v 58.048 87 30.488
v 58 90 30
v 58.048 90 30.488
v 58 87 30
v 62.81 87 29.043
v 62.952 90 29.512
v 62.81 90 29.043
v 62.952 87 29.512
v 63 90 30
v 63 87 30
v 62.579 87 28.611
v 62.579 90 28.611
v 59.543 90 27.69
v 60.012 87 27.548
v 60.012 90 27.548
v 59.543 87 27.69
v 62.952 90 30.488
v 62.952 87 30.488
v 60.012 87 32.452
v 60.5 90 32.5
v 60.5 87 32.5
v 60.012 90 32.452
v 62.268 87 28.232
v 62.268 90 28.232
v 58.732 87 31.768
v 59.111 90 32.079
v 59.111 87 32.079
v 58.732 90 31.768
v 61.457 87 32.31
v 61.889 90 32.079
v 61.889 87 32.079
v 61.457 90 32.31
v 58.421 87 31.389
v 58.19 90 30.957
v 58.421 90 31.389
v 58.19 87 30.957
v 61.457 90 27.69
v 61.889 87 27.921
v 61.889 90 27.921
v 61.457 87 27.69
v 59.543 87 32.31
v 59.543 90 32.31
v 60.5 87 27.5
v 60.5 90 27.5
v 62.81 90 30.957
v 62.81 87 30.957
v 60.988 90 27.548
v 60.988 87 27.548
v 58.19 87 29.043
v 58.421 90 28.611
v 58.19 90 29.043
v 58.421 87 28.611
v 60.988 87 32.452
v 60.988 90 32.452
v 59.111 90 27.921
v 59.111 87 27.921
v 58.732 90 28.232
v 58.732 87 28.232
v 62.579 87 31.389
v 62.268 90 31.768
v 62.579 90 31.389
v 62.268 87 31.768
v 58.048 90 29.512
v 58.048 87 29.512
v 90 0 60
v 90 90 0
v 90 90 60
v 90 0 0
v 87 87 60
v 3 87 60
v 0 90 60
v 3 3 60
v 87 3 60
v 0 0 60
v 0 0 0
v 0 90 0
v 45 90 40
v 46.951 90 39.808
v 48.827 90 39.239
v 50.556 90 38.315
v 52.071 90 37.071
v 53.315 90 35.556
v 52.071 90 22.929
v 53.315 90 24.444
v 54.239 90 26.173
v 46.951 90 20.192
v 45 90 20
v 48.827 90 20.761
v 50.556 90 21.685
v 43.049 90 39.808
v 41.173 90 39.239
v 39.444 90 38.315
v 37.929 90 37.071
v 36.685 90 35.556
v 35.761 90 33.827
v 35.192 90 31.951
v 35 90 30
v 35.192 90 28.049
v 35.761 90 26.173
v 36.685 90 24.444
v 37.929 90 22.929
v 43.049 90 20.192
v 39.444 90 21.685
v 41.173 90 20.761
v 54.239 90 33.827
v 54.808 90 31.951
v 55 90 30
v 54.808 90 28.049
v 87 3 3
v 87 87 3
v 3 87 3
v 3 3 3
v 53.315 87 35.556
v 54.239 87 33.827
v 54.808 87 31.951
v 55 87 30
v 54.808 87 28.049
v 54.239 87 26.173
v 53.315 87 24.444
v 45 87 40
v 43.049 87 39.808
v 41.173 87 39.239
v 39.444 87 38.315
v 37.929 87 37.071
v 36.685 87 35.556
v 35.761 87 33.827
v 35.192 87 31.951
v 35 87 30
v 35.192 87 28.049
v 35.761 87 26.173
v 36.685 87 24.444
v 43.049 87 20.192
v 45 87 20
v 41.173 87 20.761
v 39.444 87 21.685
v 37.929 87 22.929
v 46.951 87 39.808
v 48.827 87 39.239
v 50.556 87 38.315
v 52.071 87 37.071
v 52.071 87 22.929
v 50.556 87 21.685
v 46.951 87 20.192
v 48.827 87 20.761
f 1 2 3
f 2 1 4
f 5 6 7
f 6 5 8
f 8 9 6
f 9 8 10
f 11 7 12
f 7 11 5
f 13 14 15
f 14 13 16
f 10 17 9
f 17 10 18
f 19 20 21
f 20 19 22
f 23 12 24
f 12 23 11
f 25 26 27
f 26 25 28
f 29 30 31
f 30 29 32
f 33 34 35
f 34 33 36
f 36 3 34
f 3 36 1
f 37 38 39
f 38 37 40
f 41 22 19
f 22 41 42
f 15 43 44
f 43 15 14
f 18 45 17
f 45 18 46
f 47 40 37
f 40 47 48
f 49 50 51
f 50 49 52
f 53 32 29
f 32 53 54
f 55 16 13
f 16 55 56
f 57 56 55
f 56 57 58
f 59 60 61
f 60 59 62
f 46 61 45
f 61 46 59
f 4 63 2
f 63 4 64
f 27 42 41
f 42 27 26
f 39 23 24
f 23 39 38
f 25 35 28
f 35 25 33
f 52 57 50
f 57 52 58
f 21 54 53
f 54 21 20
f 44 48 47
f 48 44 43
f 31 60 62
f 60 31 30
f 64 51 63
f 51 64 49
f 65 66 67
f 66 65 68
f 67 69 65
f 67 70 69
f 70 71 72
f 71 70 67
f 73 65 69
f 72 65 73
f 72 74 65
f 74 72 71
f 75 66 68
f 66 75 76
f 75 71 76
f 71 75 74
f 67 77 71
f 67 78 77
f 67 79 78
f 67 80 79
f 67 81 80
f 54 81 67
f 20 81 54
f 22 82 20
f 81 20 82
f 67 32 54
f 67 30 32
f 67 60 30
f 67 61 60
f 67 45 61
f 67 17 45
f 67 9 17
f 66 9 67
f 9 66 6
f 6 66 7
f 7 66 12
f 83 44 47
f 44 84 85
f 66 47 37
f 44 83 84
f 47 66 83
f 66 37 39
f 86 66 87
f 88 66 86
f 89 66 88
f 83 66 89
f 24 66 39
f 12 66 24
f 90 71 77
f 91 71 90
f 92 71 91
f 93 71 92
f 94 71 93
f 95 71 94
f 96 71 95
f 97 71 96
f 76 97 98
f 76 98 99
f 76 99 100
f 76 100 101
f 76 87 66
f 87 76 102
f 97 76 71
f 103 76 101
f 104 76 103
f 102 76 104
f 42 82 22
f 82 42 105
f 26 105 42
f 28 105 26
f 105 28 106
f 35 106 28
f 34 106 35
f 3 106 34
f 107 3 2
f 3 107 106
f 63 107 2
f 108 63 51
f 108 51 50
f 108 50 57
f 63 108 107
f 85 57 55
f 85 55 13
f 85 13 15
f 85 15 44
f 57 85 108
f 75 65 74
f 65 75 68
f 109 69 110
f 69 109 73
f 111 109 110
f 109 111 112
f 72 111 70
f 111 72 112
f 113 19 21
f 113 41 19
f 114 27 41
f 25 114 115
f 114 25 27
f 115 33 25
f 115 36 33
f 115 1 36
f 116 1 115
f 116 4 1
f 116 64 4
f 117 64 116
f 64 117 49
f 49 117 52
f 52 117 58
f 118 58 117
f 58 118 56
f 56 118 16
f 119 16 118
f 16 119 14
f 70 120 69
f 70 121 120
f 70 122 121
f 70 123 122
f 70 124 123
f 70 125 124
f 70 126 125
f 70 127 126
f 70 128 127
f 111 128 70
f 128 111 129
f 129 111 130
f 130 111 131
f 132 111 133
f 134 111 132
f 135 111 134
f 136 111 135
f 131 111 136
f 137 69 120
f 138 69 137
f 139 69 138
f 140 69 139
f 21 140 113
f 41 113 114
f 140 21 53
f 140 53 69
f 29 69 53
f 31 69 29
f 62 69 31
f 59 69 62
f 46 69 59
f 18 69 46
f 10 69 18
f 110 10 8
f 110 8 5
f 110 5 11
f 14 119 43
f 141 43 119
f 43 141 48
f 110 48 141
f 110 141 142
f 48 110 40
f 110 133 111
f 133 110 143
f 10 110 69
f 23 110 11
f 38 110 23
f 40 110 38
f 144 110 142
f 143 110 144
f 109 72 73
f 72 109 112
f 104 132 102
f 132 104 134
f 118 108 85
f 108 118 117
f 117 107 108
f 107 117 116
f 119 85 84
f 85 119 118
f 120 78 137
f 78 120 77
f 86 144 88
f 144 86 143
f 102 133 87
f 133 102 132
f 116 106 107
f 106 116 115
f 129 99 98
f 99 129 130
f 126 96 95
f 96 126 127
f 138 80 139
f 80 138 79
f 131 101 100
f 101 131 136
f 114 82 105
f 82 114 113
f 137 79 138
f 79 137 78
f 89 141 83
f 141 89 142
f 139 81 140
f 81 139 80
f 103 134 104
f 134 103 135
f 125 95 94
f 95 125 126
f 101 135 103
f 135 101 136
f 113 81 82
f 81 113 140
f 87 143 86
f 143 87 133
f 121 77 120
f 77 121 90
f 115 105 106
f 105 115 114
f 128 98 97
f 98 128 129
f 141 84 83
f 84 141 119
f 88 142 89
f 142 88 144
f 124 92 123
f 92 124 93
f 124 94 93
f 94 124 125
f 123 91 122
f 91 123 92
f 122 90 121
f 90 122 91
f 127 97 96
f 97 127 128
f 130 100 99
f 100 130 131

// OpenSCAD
$fn = 32;

// ----------------------------------------------------------------------
// Vent box: roundvent enclosure
// ----------------------------------------------------------------------

// --- parameters (mm) ---
box_l = 90;               // box length, X
box_w = 90;               // box width, Y
box_h = 60;               // box height, Z
wall_t = 3;               // shell wall thickness
vent_d = 20;              // central vent diameter
ring_d = 5;               // ring hole diameter
n_ring = 6;               // holes in the ring
ring_r = 15.5;            // ring radius

ring_step = 360 / n_ring;  // ring hole angular step

difference() {
  cube([box_l, box_w, box_h]);
  translate([wall_t, wall_t, wall_t])
    cube([box_l - 2 * wall_t, box_w - 2 * wall_t, box_h]);
  translate([box_l / 2, box_w - wall_t - 1, box_h / 2])
    rotate([-90, 0, 0]) cylinder(h = wall_t + 2, d = vent_d);
  for (i = [0 : n_ring - 1])
    translate([box_l / 2, box_w - wall_t - 1, box_h / 2])
      rotate([0, 0, i * ring_step])
        translate([ring_r, 0, 0]) rotate([-90, 0, 0])
          cylinder(h = wall_t + 2, d = ring_d);
}
